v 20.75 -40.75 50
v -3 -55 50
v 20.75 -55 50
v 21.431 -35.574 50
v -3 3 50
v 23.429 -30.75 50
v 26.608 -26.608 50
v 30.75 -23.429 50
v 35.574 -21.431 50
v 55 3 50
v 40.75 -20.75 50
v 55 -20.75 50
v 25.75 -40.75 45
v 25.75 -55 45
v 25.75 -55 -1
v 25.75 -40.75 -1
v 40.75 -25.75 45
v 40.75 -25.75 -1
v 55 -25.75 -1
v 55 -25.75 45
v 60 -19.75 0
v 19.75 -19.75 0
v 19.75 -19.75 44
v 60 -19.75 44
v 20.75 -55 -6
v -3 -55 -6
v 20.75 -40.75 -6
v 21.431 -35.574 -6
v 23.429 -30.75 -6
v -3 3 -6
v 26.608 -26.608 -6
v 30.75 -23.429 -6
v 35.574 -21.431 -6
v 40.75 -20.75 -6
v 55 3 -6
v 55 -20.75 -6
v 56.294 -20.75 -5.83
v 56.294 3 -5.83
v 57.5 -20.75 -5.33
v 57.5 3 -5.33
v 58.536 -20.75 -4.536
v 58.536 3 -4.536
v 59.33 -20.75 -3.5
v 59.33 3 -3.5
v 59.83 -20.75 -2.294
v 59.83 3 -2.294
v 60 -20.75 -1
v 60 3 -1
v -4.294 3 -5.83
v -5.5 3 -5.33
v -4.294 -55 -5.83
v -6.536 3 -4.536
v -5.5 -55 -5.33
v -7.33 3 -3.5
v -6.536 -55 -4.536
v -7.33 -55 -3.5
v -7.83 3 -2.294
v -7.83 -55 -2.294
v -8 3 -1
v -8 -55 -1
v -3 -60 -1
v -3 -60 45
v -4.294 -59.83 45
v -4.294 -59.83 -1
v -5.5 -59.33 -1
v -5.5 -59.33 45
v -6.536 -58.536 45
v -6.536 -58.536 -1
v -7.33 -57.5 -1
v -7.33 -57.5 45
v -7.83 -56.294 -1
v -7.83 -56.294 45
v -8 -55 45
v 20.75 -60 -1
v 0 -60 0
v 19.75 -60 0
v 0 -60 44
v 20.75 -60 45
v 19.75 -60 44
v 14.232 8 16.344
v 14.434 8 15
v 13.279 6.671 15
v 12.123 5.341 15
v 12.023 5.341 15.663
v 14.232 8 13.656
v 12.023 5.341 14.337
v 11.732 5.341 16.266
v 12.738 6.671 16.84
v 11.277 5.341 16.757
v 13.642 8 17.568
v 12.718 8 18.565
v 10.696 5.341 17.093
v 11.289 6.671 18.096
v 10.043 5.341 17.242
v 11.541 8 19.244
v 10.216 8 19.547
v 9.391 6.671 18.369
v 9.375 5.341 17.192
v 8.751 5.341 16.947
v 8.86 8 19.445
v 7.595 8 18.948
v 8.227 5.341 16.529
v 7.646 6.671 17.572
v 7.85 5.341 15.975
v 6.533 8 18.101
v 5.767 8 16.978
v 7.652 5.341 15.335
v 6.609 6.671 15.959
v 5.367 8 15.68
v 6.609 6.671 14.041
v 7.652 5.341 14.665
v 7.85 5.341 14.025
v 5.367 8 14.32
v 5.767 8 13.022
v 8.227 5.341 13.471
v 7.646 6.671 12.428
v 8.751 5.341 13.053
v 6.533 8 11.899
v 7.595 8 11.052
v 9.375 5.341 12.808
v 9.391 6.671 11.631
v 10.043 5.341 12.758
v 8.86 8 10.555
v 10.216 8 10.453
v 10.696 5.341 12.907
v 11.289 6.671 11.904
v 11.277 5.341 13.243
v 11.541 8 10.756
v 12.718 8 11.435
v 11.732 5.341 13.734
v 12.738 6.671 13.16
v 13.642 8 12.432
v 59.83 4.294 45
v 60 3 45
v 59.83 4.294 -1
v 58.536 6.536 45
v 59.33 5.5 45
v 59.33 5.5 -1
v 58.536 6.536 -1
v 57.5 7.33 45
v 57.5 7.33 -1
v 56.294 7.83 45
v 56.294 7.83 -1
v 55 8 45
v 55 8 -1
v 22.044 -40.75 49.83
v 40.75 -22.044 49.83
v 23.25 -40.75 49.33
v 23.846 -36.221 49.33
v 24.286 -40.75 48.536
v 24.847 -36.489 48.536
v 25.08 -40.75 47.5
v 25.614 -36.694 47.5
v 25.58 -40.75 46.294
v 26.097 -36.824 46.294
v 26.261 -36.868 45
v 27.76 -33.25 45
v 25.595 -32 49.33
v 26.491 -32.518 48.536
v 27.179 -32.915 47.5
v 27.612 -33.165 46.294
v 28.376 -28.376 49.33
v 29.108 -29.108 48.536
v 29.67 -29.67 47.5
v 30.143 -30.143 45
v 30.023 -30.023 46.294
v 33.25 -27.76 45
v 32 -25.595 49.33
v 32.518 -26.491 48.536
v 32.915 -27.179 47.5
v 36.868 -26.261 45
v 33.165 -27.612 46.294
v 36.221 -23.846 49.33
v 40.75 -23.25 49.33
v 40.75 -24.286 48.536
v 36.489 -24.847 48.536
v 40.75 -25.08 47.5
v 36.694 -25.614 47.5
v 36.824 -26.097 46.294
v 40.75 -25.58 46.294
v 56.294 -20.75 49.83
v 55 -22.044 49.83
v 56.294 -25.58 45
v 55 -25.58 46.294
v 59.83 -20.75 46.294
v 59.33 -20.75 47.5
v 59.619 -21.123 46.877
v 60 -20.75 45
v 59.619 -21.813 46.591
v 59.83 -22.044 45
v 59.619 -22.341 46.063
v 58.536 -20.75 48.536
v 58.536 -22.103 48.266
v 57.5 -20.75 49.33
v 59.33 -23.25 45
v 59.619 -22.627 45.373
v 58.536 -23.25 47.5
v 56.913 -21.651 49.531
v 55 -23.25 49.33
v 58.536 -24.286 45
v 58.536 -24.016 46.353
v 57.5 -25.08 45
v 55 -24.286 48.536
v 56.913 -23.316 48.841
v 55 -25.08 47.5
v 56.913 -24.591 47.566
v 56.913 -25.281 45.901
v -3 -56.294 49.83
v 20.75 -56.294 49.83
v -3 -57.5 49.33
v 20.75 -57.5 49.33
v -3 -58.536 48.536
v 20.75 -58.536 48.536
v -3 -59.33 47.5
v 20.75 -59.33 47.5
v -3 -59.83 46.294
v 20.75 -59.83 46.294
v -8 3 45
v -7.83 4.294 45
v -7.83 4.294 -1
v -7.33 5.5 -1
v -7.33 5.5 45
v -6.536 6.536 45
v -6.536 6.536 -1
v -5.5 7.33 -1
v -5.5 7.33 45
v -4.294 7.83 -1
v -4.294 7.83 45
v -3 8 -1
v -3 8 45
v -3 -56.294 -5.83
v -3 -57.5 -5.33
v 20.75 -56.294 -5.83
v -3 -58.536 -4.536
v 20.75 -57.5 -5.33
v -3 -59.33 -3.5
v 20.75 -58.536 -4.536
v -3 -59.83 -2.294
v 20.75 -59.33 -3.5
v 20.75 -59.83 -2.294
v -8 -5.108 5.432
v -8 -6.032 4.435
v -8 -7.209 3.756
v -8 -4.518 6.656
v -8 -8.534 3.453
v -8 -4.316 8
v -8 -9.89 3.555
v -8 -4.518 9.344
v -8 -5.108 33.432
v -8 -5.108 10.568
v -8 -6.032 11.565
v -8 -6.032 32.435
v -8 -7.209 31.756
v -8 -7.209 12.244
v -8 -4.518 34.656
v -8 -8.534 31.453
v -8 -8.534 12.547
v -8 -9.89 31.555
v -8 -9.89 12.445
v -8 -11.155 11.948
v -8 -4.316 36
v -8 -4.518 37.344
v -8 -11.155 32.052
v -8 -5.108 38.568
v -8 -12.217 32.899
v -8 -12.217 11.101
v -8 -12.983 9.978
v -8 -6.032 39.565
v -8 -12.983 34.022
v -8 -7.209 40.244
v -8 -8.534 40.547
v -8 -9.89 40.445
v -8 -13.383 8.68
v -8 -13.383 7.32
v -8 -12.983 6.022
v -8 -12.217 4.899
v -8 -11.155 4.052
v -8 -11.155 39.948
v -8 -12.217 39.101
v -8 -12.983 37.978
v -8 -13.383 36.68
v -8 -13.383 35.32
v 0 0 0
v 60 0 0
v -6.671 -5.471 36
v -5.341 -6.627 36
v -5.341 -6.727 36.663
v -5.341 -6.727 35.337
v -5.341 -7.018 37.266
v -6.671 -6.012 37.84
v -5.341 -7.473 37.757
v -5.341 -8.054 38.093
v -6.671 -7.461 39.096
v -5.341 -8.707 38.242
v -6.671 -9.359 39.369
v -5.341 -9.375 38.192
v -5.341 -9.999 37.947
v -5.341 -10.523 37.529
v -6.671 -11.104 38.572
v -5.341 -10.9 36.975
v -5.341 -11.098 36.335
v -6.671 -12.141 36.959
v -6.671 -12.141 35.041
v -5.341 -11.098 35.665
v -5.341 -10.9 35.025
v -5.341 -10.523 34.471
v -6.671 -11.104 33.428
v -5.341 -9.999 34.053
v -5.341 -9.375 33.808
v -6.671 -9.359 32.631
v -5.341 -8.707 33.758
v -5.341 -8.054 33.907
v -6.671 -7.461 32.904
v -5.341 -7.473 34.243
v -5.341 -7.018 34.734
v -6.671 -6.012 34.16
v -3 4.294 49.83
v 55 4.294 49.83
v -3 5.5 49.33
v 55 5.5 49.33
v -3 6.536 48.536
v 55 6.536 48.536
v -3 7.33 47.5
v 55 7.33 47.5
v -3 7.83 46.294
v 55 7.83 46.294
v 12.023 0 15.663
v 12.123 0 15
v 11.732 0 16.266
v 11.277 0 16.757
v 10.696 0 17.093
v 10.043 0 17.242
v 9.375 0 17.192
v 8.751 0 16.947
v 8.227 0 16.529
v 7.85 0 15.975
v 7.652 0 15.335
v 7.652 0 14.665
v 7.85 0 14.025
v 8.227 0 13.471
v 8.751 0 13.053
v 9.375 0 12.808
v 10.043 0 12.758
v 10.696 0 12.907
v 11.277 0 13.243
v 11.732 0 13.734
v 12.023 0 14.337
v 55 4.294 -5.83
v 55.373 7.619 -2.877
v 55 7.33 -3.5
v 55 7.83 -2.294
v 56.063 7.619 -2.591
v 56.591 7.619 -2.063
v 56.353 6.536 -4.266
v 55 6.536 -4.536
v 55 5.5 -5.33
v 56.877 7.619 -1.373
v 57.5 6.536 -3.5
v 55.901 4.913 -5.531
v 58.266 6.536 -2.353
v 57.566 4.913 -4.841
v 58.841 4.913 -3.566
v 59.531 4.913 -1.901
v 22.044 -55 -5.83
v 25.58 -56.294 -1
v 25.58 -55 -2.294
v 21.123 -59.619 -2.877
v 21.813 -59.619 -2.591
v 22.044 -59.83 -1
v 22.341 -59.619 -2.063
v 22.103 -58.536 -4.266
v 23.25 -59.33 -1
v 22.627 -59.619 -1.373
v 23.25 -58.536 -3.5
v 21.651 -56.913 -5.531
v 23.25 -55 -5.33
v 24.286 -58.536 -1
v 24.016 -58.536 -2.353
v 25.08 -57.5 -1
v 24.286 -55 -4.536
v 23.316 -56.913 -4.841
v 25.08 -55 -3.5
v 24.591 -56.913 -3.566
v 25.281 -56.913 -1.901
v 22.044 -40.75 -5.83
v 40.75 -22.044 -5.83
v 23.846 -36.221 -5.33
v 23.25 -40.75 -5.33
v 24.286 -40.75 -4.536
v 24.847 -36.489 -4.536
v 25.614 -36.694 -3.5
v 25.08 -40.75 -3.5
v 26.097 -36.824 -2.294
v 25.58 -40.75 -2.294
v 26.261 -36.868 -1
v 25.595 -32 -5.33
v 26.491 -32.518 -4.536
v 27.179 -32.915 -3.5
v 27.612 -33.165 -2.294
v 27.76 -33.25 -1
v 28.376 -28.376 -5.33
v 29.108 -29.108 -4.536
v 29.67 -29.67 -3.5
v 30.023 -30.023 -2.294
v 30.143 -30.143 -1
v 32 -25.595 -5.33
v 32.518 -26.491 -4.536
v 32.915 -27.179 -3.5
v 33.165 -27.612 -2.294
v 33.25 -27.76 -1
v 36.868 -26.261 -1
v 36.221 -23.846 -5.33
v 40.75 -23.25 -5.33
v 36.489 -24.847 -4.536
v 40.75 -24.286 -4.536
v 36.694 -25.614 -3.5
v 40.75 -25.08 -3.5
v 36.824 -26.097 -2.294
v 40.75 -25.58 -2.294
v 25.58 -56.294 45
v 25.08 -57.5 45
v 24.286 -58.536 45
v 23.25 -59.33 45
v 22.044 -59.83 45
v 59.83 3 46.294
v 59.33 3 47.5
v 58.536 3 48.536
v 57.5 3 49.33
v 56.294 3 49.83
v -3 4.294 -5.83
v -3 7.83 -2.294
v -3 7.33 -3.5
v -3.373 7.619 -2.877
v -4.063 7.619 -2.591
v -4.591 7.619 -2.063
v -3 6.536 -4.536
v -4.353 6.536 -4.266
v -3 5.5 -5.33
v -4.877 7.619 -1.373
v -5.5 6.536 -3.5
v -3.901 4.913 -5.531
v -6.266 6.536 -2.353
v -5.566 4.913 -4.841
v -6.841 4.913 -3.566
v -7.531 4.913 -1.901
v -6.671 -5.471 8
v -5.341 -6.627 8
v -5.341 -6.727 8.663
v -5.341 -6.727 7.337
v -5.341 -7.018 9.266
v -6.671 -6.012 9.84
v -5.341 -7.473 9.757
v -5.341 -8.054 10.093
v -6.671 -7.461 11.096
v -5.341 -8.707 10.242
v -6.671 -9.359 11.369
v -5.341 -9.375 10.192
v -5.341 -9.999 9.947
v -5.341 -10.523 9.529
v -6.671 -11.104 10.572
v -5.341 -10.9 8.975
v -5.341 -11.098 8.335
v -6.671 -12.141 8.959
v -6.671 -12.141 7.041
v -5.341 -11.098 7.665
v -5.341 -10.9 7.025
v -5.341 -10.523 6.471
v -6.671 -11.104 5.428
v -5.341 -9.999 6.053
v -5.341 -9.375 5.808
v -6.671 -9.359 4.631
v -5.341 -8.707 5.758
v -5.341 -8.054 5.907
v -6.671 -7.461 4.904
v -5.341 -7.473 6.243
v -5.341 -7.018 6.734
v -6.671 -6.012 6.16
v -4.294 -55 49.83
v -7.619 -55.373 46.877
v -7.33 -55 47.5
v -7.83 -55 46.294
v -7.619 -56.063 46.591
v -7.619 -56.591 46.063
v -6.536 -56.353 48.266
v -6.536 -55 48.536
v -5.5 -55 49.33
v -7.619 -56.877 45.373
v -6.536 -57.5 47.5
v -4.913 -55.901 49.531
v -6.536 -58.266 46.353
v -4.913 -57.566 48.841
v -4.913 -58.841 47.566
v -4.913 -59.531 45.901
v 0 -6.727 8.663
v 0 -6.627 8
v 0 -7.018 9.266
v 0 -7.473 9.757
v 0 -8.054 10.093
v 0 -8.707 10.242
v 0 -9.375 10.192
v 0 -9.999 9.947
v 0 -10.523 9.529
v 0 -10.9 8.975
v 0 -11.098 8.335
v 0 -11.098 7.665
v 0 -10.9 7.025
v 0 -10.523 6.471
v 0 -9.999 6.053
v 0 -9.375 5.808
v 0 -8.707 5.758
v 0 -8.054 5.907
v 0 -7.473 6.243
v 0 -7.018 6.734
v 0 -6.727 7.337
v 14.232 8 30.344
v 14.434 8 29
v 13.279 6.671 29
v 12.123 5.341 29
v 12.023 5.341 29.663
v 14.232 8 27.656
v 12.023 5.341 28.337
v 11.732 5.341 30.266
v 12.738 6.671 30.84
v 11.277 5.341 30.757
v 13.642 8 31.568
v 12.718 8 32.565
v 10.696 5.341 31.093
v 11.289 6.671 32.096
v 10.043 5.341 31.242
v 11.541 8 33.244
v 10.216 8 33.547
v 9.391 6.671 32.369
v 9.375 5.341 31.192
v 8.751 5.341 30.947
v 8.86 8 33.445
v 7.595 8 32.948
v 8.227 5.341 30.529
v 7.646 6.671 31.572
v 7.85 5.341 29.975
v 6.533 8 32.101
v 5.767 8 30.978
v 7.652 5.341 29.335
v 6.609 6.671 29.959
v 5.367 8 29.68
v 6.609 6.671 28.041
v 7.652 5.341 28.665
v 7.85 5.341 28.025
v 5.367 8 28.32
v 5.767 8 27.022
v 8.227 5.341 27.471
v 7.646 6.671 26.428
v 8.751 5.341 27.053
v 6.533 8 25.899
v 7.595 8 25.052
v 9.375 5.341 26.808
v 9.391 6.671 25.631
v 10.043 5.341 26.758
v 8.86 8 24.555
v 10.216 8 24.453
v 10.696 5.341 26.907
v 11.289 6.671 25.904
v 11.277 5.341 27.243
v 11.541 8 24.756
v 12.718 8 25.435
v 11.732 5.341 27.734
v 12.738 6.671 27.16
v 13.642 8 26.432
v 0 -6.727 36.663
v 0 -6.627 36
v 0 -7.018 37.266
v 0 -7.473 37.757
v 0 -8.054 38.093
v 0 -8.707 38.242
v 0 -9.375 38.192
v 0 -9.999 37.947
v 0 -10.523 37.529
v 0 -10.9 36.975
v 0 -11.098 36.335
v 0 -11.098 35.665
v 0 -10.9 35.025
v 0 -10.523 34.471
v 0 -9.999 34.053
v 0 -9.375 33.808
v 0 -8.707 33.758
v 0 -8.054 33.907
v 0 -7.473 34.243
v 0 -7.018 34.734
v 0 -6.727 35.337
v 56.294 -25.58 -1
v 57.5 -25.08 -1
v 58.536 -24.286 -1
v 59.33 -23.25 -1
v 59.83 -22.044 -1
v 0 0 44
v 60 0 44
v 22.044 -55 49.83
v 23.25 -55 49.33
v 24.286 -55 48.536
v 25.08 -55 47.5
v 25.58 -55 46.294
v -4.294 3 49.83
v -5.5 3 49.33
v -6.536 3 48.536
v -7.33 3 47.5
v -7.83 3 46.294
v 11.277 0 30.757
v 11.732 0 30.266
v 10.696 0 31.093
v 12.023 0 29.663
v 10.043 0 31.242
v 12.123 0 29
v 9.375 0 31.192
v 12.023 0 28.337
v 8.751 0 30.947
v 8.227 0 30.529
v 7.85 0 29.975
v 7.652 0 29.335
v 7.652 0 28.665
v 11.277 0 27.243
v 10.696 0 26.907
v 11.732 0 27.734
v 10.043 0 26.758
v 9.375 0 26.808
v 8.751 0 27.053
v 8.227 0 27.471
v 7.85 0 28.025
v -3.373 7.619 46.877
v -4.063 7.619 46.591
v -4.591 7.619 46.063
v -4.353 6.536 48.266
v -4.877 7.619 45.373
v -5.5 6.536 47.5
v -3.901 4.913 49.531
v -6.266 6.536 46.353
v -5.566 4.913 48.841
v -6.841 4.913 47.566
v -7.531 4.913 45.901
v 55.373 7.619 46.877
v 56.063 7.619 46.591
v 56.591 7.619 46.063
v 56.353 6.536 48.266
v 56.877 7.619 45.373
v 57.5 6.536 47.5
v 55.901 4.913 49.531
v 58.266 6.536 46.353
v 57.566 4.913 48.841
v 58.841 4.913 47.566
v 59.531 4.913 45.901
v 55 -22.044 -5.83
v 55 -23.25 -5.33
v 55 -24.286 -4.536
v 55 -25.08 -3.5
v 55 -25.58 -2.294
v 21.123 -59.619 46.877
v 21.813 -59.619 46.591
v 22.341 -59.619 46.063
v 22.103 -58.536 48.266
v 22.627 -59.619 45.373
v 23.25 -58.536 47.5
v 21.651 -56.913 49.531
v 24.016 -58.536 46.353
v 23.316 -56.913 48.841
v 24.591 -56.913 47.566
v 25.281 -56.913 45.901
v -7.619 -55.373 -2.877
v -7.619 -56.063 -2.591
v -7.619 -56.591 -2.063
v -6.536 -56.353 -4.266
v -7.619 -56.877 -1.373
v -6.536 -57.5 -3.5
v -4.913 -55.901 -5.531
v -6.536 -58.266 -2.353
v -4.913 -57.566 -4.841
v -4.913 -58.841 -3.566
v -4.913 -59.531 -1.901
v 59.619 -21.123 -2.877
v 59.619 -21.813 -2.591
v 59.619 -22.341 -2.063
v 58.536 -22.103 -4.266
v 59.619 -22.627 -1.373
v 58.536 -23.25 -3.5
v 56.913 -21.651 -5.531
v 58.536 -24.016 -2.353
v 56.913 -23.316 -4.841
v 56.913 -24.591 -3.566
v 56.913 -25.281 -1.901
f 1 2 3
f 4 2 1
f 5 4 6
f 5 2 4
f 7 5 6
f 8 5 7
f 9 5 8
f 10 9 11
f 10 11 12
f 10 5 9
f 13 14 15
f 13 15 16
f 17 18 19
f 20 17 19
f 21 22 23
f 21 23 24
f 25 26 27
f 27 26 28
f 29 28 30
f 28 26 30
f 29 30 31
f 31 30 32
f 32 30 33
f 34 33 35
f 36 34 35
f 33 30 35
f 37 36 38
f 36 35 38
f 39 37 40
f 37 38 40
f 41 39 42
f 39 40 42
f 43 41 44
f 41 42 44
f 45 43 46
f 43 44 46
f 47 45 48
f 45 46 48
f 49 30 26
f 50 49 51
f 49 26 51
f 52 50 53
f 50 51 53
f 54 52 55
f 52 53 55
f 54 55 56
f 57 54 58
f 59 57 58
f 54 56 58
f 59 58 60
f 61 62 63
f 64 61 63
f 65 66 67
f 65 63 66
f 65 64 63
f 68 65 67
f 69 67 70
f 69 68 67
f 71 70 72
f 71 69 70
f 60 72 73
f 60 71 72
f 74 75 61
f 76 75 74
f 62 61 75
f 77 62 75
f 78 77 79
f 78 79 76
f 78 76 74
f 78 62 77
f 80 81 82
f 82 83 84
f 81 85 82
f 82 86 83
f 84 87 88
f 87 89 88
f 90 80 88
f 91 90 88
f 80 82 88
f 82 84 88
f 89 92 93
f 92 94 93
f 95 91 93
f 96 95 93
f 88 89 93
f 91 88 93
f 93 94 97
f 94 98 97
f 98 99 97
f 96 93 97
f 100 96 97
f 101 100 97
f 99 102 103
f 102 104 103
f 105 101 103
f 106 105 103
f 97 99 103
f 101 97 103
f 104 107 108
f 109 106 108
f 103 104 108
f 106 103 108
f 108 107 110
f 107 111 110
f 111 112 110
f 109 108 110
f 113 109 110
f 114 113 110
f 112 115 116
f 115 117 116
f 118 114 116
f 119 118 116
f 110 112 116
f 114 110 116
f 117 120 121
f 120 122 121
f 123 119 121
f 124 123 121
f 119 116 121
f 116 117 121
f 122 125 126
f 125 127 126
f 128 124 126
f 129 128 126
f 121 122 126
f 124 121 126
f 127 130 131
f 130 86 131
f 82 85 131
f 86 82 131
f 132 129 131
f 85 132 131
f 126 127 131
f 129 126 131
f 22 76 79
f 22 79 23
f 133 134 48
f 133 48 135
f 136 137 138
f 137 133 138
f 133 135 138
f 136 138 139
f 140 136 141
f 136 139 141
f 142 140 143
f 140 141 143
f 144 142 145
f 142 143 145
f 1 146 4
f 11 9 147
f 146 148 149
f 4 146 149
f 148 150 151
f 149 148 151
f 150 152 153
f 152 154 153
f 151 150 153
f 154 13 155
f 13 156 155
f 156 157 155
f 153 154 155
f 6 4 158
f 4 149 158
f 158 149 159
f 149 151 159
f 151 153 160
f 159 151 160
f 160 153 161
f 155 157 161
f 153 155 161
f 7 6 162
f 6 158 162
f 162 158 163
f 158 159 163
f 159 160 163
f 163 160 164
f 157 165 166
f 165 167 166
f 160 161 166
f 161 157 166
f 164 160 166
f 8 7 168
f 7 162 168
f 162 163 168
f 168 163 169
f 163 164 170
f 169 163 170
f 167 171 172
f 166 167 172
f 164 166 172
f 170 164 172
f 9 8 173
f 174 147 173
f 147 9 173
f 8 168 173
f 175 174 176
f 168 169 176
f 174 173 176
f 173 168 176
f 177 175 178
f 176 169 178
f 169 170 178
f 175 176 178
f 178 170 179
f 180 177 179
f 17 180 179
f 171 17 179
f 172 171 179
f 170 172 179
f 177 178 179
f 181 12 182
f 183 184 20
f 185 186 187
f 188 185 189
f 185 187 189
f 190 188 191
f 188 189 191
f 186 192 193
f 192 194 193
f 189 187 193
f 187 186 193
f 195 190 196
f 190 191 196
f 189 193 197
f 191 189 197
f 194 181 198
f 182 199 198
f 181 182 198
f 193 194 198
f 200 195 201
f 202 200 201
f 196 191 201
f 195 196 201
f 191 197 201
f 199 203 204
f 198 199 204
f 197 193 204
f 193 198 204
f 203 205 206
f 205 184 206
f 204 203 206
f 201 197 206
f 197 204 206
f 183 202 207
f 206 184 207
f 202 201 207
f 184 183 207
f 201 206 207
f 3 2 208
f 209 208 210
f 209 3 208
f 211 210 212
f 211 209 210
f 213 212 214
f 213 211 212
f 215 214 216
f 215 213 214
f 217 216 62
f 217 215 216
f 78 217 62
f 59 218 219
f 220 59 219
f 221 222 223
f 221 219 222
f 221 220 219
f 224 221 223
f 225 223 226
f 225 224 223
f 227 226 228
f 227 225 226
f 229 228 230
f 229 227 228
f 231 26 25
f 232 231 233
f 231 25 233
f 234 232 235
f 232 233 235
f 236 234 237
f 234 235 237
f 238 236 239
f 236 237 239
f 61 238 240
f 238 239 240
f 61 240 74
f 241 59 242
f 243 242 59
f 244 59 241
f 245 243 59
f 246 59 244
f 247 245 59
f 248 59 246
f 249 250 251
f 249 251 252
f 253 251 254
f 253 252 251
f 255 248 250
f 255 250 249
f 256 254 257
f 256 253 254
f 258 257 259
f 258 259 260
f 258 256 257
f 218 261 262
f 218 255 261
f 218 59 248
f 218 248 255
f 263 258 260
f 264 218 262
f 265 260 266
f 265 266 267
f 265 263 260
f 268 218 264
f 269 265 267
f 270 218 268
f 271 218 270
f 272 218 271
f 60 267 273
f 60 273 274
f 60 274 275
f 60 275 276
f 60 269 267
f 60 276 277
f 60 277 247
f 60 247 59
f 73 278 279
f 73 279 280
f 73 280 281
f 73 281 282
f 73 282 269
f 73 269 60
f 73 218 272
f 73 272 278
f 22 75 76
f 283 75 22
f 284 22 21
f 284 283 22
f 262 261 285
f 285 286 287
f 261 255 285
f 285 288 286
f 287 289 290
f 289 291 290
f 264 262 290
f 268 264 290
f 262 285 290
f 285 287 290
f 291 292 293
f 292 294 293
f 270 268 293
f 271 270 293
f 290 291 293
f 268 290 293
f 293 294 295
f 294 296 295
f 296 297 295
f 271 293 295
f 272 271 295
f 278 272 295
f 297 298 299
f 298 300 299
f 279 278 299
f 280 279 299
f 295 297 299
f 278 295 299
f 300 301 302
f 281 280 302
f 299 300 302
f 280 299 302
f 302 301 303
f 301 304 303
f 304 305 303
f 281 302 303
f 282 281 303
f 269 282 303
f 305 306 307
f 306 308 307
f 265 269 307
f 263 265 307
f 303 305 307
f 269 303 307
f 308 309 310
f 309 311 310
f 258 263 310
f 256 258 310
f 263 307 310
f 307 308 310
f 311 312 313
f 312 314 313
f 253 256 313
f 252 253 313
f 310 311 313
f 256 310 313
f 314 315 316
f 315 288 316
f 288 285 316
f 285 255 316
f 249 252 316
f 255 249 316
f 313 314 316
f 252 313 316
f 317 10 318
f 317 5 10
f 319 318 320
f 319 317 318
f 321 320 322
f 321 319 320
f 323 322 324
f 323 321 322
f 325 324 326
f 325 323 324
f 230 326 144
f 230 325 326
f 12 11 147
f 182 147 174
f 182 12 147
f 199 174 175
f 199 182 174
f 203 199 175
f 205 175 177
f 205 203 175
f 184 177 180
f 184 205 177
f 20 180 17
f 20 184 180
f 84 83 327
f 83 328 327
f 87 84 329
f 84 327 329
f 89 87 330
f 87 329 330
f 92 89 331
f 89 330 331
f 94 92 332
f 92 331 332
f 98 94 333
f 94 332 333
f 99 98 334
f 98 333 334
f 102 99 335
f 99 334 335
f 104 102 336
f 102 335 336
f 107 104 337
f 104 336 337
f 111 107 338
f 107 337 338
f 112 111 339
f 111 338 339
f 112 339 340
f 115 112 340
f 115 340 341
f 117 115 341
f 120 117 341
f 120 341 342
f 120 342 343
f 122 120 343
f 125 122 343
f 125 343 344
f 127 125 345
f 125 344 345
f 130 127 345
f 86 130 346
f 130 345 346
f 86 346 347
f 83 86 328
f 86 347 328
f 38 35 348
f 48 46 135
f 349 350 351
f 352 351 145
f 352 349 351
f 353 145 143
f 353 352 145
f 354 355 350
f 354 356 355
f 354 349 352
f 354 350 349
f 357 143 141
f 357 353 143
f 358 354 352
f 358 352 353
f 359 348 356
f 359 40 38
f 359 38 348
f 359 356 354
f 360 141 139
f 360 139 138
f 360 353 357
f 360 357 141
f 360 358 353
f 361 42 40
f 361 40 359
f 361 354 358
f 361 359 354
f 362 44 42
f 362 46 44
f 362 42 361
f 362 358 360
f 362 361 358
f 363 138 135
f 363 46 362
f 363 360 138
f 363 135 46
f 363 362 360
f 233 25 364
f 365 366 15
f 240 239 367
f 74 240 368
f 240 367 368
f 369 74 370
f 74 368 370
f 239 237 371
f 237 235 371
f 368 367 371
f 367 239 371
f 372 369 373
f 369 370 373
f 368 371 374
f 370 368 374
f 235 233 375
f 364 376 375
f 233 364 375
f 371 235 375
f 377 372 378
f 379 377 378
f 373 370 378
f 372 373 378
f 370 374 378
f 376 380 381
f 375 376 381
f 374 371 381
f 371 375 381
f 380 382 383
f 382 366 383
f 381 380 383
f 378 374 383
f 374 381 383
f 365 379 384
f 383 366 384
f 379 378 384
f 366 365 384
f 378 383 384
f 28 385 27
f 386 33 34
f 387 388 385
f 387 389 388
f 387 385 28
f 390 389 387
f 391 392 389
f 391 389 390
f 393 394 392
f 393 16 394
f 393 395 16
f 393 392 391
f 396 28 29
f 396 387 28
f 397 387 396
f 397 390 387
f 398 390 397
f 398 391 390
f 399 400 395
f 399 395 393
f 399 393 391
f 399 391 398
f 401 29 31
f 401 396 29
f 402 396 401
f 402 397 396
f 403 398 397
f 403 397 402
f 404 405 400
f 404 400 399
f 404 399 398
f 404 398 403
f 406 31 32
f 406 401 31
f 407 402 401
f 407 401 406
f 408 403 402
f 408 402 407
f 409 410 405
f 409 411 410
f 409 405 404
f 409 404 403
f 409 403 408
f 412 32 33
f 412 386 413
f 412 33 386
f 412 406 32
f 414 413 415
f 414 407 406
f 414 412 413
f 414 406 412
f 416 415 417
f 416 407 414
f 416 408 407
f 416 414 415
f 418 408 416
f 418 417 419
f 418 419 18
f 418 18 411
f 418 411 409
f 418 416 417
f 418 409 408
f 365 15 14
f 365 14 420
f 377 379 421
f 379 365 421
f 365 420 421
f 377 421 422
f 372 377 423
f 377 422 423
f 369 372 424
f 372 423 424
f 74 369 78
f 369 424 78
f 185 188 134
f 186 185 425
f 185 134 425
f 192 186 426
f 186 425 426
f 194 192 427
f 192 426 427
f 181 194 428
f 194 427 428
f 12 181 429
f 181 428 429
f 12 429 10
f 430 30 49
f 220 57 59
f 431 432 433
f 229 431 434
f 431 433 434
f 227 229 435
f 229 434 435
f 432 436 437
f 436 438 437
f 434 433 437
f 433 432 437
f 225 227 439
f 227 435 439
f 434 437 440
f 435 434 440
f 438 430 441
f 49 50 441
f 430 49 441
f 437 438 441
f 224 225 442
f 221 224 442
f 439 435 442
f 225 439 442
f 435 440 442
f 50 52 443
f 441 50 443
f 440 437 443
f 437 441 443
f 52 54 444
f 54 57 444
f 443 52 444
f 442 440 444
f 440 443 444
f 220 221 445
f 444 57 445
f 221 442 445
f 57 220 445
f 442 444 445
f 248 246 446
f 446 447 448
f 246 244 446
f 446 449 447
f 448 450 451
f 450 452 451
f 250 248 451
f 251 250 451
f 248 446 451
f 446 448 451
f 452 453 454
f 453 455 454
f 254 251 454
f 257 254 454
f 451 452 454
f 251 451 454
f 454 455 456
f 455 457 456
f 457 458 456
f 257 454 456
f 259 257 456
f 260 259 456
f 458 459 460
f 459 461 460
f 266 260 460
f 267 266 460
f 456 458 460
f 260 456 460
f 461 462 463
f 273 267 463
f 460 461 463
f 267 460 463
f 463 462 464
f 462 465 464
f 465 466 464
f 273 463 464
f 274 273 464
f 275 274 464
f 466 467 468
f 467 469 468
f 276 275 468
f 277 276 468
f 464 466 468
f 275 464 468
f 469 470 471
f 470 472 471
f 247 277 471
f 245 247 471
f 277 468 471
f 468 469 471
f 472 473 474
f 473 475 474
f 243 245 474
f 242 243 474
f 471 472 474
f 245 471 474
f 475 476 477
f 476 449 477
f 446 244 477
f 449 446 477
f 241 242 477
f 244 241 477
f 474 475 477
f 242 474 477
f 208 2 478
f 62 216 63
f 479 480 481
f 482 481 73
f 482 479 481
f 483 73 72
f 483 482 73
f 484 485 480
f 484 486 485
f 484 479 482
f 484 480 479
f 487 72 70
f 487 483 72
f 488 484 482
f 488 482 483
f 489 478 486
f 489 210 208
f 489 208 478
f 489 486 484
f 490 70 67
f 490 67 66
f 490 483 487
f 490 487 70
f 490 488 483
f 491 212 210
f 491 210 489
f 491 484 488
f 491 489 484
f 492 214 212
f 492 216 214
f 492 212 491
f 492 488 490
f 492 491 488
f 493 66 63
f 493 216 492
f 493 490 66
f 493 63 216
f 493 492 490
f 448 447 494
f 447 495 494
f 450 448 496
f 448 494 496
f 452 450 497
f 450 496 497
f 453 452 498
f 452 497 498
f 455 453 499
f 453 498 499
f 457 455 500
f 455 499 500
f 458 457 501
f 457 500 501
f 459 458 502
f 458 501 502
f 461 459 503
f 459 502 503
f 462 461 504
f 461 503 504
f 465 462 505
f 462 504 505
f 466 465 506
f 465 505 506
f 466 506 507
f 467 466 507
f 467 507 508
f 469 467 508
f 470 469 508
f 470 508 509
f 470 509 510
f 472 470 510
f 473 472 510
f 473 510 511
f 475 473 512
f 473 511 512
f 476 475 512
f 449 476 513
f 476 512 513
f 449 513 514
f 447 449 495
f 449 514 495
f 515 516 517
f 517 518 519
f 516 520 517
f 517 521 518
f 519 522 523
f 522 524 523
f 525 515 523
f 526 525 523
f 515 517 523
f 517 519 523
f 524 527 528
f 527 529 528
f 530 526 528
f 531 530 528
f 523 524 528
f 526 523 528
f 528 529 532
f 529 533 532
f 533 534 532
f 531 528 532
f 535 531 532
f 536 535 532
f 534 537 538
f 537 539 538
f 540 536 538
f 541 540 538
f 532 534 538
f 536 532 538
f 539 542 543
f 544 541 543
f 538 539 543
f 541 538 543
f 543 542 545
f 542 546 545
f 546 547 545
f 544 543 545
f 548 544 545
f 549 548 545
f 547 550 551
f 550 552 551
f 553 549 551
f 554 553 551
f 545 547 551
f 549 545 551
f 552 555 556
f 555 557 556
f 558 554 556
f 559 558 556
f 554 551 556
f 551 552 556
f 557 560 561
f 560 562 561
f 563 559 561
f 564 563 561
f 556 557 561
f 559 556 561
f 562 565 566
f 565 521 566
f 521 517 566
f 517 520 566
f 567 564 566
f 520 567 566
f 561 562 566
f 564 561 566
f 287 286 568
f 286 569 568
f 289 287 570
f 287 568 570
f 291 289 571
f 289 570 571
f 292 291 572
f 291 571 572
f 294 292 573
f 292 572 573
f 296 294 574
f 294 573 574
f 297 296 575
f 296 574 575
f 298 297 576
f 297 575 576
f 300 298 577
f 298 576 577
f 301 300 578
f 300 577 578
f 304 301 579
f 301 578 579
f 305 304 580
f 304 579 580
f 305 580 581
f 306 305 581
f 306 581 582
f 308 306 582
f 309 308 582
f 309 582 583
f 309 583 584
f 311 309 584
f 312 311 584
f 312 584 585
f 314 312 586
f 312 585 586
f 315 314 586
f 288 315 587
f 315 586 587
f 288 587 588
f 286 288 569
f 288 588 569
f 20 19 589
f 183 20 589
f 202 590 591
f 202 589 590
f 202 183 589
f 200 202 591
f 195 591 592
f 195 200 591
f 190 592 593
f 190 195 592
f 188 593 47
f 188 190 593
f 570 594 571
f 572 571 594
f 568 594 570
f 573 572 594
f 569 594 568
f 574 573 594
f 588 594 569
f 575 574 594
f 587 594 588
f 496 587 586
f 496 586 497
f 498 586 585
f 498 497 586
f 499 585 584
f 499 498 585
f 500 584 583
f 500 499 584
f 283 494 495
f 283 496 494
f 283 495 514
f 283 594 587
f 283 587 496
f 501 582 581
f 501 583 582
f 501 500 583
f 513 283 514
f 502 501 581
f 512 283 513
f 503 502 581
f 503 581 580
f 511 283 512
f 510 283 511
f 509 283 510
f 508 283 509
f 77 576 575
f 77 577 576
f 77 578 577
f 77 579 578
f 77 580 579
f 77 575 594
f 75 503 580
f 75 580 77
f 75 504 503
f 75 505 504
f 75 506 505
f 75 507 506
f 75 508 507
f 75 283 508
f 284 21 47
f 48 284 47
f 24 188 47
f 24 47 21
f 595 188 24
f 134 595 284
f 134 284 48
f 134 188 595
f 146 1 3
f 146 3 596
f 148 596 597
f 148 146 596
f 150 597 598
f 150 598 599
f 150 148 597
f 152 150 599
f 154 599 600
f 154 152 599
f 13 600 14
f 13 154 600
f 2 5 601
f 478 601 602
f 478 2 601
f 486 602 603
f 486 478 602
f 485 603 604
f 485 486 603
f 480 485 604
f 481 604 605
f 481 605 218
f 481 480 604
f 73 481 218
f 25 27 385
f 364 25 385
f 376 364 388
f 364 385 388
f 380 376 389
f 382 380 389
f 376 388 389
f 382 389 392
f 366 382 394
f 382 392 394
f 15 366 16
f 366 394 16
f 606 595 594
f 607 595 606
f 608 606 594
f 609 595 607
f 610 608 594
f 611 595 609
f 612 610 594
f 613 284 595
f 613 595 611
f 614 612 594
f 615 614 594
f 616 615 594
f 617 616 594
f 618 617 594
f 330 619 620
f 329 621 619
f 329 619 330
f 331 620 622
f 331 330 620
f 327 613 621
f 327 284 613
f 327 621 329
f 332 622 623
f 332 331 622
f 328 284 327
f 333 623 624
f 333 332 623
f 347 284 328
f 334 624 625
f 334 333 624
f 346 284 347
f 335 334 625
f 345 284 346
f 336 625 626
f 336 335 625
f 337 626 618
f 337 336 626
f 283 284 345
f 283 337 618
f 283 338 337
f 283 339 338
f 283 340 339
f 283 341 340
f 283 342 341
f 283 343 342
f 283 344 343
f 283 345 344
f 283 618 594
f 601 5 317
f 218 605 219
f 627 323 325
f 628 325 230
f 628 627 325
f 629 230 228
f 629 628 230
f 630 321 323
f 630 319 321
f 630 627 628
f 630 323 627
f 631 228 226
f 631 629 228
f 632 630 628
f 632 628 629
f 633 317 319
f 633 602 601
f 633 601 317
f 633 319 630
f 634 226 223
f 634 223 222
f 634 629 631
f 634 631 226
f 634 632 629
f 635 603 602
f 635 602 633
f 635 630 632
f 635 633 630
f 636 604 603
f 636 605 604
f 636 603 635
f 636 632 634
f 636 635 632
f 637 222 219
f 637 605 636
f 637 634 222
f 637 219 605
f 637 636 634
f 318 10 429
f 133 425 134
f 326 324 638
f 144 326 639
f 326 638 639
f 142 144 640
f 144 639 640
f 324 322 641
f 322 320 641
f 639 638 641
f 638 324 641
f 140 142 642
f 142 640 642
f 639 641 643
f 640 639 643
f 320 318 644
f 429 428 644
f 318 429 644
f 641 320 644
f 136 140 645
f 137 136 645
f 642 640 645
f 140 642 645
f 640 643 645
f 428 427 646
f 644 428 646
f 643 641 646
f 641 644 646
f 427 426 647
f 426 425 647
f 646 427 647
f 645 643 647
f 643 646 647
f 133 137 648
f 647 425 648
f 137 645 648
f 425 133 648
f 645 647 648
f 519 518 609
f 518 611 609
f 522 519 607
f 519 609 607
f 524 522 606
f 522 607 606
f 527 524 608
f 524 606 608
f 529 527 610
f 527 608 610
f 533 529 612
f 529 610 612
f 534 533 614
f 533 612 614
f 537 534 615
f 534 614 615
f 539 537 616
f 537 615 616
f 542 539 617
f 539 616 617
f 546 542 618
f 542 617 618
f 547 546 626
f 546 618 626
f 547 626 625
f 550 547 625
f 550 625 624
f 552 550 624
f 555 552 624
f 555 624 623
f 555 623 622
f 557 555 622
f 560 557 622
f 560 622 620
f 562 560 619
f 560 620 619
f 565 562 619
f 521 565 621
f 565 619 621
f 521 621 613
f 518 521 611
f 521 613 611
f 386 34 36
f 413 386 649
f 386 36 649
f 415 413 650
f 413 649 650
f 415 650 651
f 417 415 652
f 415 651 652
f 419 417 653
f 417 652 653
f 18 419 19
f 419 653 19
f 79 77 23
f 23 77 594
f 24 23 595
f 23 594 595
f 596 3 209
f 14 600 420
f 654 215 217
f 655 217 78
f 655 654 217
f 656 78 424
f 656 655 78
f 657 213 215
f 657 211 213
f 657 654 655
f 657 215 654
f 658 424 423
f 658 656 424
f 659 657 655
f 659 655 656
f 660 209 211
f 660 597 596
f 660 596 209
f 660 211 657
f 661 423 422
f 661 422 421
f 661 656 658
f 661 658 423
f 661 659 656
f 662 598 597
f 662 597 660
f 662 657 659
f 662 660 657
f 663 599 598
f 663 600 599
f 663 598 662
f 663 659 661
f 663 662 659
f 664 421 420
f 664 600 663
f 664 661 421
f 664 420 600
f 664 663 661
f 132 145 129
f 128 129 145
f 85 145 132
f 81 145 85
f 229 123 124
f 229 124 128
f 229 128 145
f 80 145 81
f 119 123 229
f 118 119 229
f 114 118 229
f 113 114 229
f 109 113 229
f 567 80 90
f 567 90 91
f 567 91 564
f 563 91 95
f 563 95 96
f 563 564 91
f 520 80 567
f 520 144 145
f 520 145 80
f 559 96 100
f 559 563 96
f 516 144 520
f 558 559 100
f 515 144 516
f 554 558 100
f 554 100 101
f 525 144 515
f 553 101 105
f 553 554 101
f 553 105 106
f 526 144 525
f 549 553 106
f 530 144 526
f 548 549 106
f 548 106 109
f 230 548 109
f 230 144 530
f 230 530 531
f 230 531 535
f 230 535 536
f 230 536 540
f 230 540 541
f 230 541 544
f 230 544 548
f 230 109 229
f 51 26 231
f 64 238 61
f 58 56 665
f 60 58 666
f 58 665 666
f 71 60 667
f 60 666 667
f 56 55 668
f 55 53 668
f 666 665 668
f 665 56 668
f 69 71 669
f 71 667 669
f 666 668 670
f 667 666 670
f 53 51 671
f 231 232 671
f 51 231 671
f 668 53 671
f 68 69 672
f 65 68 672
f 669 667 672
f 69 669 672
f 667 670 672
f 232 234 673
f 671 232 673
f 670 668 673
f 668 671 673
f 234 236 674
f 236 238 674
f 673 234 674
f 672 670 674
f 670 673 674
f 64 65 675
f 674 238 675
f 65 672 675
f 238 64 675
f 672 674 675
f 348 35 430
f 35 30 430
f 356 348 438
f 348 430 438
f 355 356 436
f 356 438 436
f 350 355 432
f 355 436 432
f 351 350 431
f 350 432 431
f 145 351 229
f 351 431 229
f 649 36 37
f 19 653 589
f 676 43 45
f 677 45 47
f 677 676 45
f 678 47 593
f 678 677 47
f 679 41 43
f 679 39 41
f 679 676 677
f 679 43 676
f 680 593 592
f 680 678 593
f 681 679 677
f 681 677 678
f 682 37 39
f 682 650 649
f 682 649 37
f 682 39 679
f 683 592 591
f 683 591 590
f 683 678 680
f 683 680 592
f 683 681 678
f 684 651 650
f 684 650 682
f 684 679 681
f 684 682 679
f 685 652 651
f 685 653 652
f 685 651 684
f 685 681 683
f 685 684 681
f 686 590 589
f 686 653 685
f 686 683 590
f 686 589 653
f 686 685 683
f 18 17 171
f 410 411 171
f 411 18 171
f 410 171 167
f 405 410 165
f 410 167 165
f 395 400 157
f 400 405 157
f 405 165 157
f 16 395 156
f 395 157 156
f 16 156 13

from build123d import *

# Parameters (mm, degrees)
F1_DEPTH             = 50
F1_DEPTH_BACK        = 6
F2_DEPTH             = 44
F5_D                 = 4.4958
F5_CSINK_D           = 9.1186
F5_CSINK_ANGLE       = 82
F5_ON_F3_D           = 4.4958
F5_ON_F3_CSINK_D     = 9.1186
F5_ON_F3_CSINK_ANGLE = 82
F6_R                 = 15
F7_R                 = 5


with BuildPart() as f1:
    # F0 (on Top) → F1 (new body, two sides)
    with BuildSketch(Plane.XY) as f1_sk:
        Polygon((-8, -60), (0, -60), (0, 0), (60, 0), (60, 8), (-8, 8), align=None)
        Polygon((19.75, -19.75), (19.75, -60), (25.75, -60), (25.75, -25.75), (60, -25.75), (60, -19.75), align=None)
        Polygon((0, 0), (0, -60), (19.75, -60), (19.75, -19.75), (60, -19.75), (60, 0), align=None)
    extrude(amount=F1_DEPTH)
    extrude(f1_sk.sketch, amount=-F1_DEPTH_BACK)

    # F0 (on Top) → F2 (cut)
    with BuildSketch(Plane.XY):
        Polygon((0, 0), (0, -60), (19.75, -60), (19.75, -19.75), (60, -19.75), (60, 0), align=None)
    extrude(amount=F2_DEPTH, mode=Mode.SUBTRACT)

    # F5 (through all)
    with Locations(Plane(origin=(-8, 0, 0), x_dir=(0, -1, 0), z_dir=(-1, 0, 0))):
        with Locations((8.875, 36), (8.875, 8)):
            CounterSinkHole(F5_D / 2, F5_CSINK_D / 2, counter_sink_angle=F5_CSINK_ANGLE)

    # F5 on F3 (through all)
    with Locations(Plane(origin=(0, 8, 0), x_dir=(-1, 0, 0), z_dir=(0, 1, 0))):
        with Locations((-9.875, 29), (-9.875, 15)):
            CounterSinkHole(F5_ON_F3_D / 2, F5_ON_F3_CSINK_D / 2, counter_sink_angle=F5_ON_F3_CSINK_ANGLE)

    # F6
    f6_edges = [f1.edges().sort_by_distance(p)[0] for p in [
        (25.75, -25.75, 22),
    ]]
    fillet(f6_edges, radius=F6_R)

    # F7
    f7_edges = [f1.edges().sort_by_distance(p)[0] for p in [
        (25.75, -50.375, 50),
        (30.143398, -30.143398, 50),
        (8.875, -60, 50),
        (50.375, -25.75, 50),
        (-8, -26, 50),
        (60, -8.875, 50),
        (26, 8, 50),
        (25.75, -50.375, -6),
        (30.143398, -30.143398, -6),
        (8.875, -60, -6),
        (50.375, -25.75, -6),
        (-8, -26, -6),
        (60, -8.875, -6),
        (26, 8, -6),
        (60, -25.75, 22),
        (60, 8, 22),
        (25.75, -60, 22),
        (-8, -60, 22),
        (-8, 8, 22),
    ]]
    fillet(f7_edges, radius=F7_R)


solid = f1.part
